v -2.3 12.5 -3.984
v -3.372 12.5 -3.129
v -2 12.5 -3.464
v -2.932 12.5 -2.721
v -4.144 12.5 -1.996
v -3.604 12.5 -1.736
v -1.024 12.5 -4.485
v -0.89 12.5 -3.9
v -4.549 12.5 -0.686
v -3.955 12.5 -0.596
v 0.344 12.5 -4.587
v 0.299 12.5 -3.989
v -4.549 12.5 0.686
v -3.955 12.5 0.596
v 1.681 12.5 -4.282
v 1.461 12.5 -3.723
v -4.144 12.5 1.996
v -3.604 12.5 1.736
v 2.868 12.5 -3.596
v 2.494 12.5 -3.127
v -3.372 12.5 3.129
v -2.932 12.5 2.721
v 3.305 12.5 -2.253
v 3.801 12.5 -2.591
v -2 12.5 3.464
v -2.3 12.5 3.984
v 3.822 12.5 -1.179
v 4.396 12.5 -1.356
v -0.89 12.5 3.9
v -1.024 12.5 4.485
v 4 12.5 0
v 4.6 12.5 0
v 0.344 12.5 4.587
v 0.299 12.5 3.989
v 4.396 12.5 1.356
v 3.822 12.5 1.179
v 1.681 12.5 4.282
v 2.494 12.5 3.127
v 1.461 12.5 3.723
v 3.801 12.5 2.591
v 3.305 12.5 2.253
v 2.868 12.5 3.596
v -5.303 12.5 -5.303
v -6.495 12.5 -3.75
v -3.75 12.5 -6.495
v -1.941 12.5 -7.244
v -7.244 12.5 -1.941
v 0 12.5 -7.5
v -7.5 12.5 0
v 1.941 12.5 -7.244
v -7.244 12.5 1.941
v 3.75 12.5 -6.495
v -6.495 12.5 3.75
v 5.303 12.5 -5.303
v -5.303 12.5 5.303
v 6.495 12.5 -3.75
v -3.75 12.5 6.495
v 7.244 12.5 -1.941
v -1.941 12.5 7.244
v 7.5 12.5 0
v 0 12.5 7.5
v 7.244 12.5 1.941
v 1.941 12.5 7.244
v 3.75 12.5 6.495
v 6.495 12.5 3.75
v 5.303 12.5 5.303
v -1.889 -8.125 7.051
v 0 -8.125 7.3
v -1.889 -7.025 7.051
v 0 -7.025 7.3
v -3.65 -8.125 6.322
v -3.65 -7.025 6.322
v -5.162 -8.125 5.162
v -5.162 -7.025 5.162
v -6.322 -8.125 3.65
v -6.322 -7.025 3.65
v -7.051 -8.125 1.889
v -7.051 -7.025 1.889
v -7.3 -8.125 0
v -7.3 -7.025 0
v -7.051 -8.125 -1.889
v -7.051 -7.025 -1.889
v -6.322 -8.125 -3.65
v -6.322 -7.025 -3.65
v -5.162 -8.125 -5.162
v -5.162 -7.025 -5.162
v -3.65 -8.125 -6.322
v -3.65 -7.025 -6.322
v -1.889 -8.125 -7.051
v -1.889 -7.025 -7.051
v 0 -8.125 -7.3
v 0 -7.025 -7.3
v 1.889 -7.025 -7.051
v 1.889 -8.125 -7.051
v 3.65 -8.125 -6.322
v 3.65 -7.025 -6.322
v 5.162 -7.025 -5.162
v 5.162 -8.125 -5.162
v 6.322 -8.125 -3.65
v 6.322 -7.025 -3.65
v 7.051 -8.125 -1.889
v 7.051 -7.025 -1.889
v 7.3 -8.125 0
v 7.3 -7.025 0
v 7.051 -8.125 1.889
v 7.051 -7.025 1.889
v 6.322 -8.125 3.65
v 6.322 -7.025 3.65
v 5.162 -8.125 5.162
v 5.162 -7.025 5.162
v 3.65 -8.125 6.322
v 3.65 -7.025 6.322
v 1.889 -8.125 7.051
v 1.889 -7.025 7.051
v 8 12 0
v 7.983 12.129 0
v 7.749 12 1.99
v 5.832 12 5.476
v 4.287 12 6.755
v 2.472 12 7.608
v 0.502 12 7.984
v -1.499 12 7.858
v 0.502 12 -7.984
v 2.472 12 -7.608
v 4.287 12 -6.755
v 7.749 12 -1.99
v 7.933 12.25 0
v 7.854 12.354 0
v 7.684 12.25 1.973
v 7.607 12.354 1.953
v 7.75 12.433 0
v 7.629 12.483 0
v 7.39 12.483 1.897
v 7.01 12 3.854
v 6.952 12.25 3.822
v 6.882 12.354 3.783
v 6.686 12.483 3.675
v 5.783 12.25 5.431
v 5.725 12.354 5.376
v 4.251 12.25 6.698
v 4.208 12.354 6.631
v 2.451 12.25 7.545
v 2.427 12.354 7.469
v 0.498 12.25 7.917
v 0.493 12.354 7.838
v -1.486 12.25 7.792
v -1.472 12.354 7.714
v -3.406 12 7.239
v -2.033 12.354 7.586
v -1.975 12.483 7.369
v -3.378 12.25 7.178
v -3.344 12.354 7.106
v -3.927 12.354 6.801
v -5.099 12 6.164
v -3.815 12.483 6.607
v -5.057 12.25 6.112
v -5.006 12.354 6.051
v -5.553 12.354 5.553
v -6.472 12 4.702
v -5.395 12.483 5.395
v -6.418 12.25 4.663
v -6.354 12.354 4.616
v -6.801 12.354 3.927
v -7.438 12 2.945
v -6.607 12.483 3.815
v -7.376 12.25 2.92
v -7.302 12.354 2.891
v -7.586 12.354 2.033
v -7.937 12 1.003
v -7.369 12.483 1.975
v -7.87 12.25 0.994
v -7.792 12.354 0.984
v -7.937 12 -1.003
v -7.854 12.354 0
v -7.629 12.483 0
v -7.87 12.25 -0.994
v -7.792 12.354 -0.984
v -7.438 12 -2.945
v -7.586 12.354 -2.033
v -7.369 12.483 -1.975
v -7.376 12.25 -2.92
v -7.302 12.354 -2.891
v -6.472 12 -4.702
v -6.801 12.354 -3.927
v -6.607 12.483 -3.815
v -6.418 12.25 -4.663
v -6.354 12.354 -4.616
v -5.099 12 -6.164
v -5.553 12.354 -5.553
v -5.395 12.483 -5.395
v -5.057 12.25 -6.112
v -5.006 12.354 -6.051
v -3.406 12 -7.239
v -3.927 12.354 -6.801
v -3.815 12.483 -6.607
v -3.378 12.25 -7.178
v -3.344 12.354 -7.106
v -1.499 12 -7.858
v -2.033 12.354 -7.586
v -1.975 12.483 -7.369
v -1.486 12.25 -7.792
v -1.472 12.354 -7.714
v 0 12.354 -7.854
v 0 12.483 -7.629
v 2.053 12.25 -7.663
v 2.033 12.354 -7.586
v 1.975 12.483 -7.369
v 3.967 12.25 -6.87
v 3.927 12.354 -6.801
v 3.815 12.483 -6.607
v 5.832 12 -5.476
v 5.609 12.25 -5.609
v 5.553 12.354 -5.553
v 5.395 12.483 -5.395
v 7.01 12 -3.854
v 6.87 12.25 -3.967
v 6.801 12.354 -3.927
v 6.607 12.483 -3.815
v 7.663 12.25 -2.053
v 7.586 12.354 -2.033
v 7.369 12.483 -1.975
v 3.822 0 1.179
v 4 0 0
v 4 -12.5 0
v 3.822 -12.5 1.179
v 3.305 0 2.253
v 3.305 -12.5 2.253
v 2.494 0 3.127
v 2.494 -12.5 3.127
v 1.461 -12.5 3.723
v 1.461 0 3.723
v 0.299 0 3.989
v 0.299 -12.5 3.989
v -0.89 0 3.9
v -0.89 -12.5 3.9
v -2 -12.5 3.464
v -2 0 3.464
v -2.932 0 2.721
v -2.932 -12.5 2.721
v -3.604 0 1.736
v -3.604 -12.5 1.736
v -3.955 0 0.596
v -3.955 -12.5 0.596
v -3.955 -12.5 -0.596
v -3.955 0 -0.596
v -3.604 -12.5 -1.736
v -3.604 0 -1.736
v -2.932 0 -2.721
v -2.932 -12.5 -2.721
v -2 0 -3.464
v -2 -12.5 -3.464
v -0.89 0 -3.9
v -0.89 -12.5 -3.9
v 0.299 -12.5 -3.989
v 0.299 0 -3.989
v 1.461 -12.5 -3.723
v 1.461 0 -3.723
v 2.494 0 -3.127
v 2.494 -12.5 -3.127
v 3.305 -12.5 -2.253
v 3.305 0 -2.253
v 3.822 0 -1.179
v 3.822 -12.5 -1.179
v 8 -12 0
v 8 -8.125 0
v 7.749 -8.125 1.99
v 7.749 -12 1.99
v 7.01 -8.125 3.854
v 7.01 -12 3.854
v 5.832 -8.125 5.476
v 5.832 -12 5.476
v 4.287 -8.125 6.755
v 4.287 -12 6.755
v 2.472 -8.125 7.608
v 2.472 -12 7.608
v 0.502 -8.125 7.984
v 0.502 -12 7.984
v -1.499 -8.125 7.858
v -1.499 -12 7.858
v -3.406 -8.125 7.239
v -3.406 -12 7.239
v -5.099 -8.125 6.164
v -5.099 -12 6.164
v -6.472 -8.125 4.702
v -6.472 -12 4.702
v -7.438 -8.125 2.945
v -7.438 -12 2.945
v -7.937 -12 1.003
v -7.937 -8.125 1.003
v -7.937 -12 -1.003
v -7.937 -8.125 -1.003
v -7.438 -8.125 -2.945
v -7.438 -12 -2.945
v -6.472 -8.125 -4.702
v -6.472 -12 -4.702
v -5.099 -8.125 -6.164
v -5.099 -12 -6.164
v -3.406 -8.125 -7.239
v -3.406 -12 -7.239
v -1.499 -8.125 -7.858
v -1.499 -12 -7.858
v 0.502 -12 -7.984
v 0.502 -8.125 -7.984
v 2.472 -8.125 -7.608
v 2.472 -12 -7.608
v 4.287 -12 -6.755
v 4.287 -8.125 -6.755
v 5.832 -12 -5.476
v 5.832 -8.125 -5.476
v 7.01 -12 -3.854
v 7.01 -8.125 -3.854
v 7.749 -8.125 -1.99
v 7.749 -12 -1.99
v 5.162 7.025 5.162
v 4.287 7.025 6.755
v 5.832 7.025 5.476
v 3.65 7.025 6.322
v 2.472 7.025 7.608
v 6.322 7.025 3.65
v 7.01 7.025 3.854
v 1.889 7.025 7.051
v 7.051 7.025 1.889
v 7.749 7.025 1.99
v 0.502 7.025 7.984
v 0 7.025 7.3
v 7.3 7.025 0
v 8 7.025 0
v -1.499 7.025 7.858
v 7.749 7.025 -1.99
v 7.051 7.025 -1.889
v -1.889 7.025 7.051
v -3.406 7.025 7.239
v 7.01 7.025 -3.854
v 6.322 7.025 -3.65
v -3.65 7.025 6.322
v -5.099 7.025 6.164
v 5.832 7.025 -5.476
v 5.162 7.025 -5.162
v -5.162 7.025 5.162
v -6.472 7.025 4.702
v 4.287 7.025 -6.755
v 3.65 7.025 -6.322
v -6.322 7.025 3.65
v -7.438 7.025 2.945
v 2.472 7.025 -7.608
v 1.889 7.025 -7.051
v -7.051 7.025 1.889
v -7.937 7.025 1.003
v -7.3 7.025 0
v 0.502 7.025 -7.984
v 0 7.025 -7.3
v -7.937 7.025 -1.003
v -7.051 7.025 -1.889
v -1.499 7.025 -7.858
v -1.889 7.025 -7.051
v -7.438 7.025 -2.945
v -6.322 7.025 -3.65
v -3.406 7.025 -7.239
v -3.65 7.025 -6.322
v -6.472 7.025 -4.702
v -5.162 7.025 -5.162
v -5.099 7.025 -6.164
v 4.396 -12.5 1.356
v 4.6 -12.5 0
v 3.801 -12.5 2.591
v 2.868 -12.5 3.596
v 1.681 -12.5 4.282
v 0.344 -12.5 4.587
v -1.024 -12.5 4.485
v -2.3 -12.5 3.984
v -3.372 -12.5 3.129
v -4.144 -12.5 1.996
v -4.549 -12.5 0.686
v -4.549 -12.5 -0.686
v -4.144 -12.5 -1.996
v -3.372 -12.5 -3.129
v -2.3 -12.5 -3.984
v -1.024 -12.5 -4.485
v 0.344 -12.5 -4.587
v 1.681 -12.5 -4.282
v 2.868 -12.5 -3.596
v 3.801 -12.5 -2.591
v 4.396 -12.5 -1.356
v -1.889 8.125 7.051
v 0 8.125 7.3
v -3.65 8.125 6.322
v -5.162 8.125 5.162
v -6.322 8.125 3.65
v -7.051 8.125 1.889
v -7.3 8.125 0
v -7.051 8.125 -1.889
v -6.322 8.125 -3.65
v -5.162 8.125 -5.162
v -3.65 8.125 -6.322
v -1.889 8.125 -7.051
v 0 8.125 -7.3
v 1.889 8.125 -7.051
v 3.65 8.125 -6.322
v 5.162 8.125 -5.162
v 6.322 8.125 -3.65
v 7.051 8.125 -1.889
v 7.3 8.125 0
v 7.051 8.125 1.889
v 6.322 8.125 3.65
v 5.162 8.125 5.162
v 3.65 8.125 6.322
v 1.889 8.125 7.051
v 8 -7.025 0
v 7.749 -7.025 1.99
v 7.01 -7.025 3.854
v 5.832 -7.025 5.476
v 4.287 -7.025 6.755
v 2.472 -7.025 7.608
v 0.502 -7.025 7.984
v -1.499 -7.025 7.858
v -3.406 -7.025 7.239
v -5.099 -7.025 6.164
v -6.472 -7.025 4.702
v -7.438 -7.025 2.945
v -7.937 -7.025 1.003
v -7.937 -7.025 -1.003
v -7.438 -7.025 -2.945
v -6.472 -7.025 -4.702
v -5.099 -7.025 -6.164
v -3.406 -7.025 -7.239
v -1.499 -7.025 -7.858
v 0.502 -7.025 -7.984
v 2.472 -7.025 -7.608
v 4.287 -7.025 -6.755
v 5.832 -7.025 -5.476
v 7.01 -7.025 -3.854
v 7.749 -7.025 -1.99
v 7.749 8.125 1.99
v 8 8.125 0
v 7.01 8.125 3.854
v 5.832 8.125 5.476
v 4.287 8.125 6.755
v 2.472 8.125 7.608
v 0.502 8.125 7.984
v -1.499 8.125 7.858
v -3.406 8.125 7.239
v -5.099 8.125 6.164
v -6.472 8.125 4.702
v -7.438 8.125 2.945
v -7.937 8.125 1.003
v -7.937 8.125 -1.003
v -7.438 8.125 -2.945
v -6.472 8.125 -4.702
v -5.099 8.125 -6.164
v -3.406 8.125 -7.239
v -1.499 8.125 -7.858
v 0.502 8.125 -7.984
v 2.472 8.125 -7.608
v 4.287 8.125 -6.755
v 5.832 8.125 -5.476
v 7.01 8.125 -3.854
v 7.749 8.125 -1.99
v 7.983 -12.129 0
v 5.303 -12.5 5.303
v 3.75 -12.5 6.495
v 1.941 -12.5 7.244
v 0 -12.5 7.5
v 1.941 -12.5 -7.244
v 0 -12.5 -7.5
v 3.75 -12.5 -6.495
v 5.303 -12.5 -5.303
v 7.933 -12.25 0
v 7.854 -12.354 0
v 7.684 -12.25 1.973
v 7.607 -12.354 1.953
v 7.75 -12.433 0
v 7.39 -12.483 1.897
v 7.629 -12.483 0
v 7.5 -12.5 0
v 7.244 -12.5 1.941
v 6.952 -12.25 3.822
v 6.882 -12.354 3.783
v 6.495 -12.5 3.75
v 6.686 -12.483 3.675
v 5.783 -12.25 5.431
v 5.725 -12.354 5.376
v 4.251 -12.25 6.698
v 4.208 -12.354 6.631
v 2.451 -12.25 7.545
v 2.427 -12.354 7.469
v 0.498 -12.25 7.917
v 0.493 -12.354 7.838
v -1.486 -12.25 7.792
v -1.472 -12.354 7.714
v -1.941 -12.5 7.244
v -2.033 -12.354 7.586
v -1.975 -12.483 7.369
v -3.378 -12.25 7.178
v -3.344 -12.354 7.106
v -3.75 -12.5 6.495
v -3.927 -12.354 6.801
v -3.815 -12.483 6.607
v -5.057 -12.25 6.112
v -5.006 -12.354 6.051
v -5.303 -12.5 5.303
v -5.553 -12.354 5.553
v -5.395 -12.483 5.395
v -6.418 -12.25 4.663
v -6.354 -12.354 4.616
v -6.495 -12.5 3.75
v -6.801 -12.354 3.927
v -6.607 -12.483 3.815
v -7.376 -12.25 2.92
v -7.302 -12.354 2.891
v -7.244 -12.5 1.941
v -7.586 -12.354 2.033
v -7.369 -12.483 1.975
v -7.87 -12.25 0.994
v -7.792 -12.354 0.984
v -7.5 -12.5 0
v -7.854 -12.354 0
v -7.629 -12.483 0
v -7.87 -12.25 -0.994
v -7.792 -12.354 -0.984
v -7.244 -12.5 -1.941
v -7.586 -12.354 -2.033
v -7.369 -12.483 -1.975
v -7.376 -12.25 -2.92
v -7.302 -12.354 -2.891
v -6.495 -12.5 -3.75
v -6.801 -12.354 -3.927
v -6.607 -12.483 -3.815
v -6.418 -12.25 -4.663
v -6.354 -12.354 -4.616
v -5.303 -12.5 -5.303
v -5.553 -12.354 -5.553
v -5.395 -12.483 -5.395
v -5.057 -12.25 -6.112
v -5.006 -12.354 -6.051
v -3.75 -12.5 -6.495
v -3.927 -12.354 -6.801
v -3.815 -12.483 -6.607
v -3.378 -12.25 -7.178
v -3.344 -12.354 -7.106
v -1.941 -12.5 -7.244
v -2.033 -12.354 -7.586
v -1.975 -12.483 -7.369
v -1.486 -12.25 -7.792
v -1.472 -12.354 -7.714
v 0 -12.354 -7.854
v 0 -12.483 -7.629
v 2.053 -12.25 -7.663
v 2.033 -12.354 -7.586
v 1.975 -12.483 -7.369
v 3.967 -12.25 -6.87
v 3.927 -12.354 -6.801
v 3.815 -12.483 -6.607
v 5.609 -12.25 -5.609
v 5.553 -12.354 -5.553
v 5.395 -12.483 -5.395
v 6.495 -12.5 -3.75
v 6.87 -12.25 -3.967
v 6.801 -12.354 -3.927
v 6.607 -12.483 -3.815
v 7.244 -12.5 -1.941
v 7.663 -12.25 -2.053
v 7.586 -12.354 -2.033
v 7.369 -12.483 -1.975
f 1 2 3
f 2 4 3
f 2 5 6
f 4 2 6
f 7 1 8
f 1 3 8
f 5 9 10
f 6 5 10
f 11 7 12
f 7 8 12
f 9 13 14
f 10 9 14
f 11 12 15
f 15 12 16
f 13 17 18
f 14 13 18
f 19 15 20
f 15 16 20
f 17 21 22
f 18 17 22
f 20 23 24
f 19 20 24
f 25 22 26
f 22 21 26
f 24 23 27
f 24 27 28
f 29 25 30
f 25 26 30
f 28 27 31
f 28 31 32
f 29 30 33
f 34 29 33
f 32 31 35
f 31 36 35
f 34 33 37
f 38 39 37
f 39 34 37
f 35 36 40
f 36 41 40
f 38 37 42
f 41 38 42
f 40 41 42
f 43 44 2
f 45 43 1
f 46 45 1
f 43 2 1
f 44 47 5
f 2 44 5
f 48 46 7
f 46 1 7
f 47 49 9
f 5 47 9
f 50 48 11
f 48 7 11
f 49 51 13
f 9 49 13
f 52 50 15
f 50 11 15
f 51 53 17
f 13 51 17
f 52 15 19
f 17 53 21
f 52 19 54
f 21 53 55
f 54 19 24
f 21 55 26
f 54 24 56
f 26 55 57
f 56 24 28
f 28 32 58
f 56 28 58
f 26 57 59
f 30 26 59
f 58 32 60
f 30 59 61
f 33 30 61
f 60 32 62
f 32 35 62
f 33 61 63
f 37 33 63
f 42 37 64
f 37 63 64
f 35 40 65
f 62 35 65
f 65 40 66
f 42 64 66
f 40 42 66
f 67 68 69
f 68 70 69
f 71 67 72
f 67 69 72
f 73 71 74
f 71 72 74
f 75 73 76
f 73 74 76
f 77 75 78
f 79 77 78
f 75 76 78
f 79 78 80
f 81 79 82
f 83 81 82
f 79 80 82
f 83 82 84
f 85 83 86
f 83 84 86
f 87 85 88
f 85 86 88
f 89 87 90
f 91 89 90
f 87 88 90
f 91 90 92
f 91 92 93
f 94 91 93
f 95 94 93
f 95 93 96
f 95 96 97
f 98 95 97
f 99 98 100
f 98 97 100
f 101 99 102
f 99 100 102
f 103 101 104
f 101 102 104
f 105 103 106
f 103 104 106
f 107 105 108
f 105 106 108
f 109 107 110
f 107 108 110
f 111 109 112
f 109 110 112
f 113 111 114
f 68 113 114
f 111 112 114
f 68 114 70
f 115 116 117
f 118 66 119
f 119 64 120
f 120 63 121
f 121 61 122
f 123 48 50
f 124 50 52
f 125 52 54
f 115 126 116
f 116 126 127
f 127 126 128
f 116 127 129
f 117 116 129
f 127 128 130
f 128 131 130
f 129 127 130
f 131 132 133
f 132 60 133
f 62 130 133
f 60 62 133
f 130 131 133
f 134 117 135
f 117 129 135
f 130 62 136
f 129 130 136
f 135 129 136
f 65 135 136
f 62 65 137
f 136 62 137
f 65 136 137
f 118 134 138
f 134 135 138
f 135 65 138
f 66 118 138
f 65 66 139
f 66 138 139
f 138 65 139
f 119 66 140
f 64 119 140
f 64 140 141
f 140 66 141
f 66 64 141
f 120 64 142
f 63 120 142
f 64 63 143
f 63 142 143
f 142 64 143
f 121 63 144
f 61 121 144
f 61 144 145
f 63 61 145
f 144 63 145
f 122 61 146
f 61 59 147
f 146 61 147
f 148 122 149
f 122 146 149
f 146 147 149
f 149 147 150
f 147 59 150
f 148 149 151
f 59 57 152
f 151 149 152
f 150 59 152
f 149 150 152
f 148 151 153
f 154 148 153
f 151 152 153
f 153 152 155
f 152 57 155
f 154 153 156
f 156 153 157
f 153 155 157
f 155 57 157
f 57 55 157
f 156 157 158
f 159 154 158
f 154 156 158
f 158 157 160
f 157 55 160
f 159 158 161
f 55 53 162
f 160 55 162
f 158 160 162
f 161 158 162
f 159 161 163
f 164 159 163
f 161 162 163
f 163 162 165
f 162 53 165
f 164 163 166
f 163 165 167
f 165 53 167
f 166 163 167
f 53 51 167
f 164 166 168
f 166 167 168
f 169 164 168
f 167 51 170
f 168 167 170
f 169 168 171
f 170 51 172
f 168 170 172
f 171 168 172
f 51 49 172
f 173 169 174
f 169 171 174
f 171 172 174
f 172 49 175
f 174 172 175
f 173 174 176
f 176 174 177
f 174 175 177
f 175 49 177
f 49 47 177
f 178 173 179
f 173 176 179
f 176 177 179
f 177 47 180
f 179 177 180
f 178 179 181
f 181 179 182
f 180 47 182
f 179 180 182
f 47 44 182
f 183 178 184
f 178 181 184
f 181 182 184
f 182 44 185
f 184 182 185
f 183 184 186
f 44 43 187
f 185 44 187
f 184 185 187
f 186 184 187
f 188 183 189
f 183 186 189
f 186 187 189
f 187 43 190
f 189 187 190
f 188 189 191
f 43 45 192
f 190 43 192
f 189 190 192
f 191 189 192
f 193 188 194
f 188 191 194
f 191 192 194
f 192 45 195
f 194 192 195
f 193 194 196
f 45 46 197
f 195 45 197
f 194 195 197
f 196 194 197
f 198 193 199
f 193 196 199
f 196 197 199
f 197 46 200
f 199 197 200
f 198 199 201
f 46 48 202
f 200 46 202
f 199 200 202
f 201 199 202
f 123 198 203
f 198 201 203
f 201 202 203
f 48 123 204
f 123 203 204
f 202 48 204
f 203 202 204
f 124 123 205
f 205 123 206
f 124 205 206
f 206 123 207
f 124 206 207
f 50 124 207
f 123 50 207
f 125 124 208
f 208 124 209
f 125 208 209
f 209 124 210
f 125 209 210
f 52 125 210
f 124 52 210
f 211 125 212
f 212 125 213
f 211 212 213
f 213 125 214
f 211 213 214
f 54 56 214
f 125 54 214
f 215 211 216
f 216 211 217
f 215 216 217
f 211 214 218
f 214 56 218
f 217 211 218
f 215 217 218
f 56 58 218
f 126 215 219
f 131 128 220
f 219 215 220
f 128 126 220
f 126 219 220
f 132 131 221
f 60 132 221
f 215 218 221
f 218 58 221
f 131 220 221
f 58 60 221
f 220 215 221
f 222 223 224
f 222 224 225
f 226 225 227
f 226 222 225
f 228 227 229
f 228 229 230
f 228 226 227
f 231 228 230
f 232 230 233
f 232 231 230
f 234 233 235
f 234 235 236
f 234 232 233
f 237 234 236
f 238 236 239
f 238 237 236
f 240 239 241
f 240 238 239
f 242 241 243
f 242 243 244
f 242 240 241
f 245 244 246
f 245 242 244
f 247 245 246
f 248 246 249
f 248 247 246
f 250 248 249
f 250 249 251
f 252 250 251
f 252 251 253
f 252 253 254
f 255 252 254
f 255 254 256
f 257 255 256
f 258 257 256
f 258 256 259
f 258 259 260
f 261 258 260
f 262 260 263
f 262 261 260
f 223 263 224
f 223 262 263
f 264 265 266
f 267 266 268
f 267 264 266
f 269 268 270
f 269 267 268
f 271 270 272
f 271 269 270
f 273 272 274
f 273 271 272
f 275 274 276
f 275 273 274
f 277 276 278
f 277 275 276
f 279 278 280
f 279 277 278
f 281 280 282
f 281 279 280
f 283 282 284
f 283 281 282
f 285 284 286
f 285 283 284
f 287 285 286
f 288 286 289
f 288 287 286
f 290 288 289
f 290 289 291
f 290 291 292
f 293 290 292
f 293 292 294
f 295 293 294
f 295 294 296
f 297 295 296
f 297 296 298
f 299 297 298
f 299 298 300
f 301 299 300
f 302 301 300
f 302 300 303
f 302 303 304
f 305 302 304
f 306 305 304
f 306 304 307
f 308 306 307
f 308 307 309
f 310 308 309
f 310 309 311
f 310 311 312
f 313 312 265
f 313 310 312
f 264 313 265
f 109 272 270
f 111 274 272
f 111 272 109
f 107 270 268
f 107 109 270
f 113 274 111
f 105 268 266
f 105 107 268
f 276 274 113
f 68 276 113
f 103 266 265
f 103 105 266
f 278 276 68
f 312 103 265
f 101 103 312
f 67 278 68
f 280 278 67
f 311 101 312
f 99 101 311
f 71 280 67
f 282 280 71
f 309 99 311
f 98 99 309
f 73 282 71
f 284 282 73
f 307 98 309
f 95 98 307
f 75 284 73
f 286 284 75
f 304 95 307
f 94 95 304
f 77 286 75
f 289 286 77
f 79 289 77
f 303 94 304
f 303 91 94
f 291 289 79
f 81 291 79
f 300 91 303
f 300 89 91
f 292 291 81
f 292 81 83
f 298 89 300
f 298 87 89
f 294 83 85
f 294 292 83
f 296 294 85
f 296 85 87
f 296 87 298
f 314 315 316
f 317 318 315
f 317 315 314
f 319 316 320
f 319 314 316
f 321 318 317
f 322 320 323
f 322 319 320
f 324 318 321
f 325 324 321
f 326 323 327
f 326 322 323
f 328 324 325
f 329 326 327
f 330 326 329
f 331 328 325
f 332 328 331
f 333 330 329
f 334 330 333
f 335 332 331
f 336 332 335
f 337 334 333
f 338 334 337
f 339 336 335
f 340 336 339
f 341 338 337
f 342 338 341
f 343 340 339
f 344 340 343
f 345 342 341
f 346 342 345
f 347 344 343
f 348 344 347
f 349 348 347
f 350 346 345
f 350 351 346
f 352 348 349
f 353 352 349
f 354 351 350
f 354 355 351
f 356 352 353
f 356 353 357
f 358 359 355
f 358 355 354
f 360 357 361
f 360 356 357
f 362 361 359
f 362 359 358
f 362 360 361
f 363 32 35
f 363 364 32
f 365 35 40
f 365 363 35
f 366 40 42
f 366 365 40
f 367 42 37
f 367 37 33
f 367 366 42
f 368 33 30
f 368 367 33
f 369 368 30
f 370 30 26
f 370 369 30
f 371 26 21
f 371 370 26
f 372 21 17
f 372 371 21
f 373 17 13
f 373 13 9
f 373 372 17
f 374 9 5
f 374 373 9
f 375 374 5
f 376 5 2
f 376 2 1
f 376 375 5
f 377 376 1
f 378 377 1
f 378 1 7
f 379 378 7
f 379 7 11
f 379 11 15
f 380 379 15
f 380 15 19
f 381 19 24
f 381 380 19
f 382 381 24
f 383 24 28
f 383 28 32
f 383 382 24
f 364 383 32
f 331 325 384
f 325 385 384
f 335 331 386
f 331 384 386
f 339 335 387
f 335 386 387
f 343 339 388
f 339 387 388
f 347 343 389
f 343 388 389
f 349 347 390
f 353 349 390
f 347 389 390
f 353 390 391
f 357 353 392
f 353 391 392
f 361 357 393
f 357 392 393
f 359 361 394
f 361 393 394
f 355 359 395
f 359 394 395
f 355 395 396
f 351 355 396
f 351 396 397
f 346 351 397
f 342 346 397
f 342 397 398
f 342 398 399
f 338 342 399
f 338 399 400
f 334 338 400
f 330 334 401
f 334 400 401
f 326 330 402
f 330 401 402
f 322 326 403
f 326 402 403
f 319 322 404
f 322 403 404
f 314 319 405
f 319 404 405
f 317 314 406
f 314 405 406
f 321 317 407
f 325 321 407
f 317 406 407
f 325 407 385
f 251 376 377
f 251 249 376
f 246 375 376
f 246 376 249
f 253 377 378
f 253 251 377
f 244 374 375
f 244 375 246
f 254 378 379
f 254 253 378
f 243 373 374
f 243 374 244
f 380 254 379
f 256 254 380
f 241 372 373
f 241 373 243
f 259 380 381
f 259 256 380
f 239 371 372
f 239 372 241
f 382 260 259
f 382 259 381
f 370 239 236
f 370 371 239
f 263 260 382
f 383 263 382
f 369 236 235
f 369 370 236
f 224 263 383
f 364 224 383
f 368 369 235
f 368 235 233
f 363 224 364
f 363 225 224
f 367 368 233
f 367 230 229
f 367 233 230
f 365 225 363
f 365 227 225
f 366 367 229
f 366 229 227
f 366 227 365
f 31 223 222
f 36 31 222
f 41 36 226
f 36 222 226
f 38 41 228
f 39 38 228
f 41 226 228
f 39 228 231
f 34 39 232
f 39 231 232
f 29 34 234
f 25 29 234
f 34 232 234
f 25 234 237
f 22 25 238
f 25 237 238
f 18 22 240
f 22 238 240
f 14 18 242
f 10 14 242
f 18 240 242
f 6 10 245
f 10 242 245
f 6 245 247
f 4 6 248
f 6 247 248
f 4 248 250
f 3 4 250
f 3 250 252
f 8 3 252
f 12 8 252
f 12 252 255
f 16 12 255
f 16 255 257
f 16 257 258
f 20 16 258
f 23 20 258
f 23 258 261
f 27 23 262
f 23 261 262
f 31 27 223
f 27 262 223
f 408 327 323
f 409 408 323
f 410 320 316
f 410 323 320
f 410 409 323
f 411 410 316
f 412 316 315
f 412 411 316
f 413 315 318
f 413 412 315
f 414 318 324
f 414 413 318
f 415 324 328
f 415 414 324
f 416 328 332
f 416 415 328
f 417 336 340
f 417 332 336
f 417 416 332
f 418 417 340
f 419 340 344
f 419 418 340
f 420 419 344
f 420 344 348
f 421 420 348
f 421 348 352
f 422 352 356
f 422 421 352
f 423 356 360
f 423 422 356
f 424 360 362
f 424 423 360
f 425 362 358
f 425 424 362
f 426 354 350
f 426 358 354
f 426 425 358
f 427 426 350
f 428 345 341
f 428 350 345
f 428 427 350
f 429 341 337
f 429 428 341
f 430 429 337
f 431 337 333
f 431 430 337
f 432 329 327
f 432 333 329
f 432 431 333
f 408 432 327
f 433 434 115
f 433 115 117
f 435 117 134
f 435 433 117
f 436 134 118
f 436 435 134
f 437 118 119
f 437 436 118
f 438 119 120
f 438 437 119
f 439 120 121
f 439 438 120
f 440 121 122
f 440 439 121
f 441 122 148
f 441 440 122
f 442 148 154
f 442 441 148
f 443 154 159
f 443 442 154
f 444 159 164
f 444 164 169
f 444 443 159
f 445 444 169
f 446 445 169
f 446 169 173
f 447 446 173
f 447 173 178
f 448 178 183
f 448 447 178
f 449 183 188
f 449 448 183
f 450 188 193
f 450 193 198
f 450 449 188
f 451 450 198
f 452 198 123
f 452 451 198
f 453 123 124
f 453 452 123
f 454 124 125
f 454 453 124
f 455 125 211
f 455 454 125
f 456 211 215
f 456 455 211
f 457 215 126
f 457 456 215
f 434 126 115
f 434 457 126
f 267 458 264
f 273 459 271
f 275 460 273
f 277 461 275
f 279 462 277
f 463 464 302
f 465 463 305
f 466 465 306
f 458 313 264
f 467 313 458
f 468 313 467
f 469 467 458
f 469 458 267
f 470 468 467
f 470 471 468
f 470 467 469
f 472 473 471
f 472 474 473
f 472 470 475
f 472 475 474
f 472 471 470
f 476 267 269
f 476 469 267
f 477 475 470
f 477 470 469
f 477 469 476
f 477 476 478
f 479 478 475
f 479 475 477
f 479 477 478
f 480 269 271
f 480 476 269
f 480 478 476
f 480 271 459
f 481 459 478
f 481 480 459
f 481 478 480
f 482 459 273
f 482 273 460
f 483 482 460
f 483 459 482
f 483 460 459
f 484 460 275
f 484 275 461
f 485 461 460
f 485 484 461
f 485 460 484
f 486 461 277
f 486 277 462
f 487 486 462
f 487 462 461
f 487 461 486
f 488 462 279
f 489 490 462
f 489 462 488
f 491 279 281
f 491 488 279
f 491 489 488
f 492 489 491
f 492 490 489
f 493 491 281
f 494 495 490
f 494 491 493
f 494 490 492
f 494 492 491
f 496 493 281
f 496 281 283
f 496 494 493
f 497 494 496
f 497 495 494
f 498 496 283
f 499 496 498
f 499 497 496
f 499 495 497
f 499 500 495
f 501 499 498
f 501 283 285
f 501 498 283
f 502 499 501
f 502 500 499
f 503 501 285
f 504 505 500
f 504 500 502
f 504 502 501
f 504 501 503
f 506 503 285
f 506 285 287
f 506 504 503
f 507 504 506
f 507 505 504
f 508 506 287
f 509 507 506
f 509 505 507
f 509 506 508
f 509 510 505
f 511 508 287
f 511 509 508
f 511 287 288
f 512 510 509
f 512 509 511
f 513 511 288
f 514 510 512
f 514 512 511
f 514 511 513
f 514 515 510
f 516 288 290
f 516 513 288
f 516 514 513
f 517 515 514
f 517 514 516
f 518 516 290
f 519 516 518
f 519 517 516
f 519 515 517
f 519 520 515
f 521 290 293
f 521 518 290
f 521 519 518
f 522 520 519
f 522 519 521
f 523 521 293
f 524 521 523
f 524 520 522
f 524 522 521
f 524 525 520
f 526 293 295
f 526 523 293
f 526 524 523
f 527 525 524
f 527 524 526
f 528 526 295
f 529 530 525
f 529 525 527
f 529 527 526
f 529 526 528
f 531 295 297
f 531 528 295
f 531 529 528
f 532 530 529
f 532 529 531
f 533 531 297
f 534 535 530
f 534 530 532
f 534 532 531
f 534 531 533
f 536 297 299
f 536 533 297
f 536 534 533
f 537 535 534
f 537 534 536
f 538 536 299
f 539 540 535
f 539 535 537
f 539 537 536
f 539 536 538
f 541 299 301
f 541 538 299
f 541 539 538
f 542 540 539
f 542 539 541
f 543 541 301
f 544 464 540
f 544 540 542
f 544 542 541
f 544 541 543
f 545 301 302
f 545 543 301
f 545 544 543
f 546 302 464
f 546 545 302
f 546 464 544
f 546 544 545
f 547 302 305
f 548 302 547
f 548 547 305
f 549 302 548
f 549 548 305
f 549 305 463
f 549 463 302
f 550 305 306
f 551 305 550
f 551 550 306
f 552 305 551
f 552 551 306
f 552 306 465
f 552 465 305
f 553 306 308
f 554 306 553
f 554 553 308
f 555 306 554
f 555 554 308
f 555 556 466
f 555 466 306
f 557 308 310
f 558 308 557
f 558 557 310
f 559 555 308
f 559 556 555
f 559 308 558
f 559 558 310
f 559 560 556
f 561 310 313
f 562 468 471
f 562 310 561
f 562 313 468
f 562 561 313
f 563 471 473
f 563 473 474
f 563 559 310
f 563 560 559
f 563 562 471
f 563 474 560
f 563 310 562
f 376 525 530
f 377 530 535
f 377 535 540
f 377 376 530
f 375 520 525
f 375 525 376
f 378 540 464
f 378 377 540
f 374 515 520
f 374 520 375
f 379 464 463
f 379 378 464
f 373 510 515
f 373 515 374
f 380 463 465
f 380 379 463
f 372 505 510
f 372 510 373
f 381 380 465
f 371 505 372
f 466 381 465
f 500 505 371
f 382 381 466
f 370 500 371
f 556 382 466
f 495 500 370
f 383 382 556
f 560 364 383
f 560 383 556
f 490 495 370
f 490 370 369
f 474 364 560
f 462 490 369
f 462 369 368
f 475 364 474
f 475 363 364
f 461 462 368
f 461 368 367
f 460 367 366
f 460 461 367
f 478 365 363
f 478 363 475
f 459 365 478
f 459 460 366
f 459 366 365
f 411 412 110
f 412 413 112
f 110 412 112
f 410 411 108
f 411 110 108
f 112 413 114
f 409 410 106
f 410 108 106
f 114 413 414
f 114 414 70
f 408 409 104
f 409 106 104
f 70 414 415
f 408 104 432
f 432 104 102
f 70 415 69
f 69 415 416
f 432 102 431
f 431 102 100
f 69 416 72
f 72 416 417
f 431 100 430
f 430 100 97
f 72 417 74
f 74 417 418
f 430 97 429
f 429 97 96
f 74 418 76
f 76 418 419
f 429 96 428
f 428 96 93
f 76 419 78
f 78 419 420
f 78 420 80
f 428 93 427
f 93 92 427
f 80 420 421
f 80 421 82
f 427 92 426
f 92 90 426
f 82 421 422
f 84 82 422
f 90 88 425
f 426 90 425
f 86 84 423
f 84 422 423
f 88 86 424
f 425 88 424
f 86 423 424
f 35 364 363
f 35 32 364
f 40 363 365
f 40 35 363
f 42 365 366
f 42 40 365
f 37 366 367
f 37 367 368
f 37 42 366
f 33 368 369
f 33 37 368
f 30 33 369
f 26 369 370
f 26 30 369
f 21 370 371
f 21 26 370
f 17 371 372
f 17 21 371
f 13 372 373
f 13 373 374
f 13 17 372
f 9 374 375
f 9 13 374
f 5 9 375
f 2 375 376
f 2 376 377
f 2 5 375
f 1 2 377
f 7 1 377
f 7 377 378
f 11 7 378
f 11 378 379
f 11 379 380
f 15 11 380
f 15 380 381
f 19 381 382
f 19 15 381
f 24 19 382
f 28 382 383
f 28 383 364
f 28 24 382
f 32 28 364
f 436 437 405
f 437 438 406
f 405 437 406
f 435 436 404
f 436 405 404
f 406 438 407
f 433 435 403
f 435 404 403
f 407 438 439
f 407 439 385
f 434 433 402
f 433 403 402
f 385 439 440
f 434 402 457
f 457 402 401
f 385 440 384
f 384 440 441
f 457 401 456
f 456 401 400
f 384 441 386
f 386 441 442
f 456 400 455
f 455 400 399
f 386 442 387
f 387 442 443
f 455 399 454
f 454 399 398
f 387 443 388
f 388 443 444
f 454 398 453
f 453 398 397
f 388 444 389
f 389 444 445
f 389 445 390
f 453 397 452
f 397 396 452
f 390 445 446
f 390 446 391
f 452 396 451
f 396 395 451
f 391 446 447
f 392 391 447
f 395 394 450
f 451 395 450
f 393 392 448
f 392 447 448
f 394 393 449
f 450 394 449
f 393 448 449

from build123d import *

# Parameters (mm, degrees)
F0_R          = 8
F0_R_2        = 4.6
F1_DEPTH      = 12.5
F0_R_3        = 4
F2_DEPTH      = 12.5
F2_DEPTH_BACK = 12.5
F3_W          = 1.1
F3_H          = 0.7
F5_R          = 0.5


with BuildPart() as f1:
    # F0 (on Front) → F1 (new body, symmetric)
    with BuildSketch(Plane.XZ):
        Circle(F0_R)
        Circle(F0_R_2, mode=Mode.SUBTRACT)
    extrude(amount=F1_DEPTH, both=True)

    # F3 (on Right) → F4 (revolve, cut)
    with BuildSketch(Plane.YZ):
        with Locations((-7.575, 7.65)):
            Rectangle(F3_W, F3_H)
        with Locations((7.575, 7.65)):
            Rectangle(F3_W, F3_H)
    revolve(axis=Axis((0, -12.5, 0), (0, -1, 0)), mode=Mode.SUBTRACT)

    # F5
    f5_edges = [f1.edges().sort_by_distance(p)[0] for p in [
        (-8, -12.5, 0),
        (-8, 12.5, 0),
    ]]
    fillet(f5_edges, radius=F5_R)


with BuildPart() as f2:
    # F0 (on Front) → F2 (new body, two sides)
    with BuildSketch(Plane.XZ) as f2_sk:
        Circle(F0_R_2)
        Circle(F0_R_3, mode=Mode.SUBTRACT)
    extrude(amount=F2_DEPTH)
    extrude(f2_sk.sketch, amount=-F2_DEPTH_BACK)


solid = Compound([f1.part, f2.part])
